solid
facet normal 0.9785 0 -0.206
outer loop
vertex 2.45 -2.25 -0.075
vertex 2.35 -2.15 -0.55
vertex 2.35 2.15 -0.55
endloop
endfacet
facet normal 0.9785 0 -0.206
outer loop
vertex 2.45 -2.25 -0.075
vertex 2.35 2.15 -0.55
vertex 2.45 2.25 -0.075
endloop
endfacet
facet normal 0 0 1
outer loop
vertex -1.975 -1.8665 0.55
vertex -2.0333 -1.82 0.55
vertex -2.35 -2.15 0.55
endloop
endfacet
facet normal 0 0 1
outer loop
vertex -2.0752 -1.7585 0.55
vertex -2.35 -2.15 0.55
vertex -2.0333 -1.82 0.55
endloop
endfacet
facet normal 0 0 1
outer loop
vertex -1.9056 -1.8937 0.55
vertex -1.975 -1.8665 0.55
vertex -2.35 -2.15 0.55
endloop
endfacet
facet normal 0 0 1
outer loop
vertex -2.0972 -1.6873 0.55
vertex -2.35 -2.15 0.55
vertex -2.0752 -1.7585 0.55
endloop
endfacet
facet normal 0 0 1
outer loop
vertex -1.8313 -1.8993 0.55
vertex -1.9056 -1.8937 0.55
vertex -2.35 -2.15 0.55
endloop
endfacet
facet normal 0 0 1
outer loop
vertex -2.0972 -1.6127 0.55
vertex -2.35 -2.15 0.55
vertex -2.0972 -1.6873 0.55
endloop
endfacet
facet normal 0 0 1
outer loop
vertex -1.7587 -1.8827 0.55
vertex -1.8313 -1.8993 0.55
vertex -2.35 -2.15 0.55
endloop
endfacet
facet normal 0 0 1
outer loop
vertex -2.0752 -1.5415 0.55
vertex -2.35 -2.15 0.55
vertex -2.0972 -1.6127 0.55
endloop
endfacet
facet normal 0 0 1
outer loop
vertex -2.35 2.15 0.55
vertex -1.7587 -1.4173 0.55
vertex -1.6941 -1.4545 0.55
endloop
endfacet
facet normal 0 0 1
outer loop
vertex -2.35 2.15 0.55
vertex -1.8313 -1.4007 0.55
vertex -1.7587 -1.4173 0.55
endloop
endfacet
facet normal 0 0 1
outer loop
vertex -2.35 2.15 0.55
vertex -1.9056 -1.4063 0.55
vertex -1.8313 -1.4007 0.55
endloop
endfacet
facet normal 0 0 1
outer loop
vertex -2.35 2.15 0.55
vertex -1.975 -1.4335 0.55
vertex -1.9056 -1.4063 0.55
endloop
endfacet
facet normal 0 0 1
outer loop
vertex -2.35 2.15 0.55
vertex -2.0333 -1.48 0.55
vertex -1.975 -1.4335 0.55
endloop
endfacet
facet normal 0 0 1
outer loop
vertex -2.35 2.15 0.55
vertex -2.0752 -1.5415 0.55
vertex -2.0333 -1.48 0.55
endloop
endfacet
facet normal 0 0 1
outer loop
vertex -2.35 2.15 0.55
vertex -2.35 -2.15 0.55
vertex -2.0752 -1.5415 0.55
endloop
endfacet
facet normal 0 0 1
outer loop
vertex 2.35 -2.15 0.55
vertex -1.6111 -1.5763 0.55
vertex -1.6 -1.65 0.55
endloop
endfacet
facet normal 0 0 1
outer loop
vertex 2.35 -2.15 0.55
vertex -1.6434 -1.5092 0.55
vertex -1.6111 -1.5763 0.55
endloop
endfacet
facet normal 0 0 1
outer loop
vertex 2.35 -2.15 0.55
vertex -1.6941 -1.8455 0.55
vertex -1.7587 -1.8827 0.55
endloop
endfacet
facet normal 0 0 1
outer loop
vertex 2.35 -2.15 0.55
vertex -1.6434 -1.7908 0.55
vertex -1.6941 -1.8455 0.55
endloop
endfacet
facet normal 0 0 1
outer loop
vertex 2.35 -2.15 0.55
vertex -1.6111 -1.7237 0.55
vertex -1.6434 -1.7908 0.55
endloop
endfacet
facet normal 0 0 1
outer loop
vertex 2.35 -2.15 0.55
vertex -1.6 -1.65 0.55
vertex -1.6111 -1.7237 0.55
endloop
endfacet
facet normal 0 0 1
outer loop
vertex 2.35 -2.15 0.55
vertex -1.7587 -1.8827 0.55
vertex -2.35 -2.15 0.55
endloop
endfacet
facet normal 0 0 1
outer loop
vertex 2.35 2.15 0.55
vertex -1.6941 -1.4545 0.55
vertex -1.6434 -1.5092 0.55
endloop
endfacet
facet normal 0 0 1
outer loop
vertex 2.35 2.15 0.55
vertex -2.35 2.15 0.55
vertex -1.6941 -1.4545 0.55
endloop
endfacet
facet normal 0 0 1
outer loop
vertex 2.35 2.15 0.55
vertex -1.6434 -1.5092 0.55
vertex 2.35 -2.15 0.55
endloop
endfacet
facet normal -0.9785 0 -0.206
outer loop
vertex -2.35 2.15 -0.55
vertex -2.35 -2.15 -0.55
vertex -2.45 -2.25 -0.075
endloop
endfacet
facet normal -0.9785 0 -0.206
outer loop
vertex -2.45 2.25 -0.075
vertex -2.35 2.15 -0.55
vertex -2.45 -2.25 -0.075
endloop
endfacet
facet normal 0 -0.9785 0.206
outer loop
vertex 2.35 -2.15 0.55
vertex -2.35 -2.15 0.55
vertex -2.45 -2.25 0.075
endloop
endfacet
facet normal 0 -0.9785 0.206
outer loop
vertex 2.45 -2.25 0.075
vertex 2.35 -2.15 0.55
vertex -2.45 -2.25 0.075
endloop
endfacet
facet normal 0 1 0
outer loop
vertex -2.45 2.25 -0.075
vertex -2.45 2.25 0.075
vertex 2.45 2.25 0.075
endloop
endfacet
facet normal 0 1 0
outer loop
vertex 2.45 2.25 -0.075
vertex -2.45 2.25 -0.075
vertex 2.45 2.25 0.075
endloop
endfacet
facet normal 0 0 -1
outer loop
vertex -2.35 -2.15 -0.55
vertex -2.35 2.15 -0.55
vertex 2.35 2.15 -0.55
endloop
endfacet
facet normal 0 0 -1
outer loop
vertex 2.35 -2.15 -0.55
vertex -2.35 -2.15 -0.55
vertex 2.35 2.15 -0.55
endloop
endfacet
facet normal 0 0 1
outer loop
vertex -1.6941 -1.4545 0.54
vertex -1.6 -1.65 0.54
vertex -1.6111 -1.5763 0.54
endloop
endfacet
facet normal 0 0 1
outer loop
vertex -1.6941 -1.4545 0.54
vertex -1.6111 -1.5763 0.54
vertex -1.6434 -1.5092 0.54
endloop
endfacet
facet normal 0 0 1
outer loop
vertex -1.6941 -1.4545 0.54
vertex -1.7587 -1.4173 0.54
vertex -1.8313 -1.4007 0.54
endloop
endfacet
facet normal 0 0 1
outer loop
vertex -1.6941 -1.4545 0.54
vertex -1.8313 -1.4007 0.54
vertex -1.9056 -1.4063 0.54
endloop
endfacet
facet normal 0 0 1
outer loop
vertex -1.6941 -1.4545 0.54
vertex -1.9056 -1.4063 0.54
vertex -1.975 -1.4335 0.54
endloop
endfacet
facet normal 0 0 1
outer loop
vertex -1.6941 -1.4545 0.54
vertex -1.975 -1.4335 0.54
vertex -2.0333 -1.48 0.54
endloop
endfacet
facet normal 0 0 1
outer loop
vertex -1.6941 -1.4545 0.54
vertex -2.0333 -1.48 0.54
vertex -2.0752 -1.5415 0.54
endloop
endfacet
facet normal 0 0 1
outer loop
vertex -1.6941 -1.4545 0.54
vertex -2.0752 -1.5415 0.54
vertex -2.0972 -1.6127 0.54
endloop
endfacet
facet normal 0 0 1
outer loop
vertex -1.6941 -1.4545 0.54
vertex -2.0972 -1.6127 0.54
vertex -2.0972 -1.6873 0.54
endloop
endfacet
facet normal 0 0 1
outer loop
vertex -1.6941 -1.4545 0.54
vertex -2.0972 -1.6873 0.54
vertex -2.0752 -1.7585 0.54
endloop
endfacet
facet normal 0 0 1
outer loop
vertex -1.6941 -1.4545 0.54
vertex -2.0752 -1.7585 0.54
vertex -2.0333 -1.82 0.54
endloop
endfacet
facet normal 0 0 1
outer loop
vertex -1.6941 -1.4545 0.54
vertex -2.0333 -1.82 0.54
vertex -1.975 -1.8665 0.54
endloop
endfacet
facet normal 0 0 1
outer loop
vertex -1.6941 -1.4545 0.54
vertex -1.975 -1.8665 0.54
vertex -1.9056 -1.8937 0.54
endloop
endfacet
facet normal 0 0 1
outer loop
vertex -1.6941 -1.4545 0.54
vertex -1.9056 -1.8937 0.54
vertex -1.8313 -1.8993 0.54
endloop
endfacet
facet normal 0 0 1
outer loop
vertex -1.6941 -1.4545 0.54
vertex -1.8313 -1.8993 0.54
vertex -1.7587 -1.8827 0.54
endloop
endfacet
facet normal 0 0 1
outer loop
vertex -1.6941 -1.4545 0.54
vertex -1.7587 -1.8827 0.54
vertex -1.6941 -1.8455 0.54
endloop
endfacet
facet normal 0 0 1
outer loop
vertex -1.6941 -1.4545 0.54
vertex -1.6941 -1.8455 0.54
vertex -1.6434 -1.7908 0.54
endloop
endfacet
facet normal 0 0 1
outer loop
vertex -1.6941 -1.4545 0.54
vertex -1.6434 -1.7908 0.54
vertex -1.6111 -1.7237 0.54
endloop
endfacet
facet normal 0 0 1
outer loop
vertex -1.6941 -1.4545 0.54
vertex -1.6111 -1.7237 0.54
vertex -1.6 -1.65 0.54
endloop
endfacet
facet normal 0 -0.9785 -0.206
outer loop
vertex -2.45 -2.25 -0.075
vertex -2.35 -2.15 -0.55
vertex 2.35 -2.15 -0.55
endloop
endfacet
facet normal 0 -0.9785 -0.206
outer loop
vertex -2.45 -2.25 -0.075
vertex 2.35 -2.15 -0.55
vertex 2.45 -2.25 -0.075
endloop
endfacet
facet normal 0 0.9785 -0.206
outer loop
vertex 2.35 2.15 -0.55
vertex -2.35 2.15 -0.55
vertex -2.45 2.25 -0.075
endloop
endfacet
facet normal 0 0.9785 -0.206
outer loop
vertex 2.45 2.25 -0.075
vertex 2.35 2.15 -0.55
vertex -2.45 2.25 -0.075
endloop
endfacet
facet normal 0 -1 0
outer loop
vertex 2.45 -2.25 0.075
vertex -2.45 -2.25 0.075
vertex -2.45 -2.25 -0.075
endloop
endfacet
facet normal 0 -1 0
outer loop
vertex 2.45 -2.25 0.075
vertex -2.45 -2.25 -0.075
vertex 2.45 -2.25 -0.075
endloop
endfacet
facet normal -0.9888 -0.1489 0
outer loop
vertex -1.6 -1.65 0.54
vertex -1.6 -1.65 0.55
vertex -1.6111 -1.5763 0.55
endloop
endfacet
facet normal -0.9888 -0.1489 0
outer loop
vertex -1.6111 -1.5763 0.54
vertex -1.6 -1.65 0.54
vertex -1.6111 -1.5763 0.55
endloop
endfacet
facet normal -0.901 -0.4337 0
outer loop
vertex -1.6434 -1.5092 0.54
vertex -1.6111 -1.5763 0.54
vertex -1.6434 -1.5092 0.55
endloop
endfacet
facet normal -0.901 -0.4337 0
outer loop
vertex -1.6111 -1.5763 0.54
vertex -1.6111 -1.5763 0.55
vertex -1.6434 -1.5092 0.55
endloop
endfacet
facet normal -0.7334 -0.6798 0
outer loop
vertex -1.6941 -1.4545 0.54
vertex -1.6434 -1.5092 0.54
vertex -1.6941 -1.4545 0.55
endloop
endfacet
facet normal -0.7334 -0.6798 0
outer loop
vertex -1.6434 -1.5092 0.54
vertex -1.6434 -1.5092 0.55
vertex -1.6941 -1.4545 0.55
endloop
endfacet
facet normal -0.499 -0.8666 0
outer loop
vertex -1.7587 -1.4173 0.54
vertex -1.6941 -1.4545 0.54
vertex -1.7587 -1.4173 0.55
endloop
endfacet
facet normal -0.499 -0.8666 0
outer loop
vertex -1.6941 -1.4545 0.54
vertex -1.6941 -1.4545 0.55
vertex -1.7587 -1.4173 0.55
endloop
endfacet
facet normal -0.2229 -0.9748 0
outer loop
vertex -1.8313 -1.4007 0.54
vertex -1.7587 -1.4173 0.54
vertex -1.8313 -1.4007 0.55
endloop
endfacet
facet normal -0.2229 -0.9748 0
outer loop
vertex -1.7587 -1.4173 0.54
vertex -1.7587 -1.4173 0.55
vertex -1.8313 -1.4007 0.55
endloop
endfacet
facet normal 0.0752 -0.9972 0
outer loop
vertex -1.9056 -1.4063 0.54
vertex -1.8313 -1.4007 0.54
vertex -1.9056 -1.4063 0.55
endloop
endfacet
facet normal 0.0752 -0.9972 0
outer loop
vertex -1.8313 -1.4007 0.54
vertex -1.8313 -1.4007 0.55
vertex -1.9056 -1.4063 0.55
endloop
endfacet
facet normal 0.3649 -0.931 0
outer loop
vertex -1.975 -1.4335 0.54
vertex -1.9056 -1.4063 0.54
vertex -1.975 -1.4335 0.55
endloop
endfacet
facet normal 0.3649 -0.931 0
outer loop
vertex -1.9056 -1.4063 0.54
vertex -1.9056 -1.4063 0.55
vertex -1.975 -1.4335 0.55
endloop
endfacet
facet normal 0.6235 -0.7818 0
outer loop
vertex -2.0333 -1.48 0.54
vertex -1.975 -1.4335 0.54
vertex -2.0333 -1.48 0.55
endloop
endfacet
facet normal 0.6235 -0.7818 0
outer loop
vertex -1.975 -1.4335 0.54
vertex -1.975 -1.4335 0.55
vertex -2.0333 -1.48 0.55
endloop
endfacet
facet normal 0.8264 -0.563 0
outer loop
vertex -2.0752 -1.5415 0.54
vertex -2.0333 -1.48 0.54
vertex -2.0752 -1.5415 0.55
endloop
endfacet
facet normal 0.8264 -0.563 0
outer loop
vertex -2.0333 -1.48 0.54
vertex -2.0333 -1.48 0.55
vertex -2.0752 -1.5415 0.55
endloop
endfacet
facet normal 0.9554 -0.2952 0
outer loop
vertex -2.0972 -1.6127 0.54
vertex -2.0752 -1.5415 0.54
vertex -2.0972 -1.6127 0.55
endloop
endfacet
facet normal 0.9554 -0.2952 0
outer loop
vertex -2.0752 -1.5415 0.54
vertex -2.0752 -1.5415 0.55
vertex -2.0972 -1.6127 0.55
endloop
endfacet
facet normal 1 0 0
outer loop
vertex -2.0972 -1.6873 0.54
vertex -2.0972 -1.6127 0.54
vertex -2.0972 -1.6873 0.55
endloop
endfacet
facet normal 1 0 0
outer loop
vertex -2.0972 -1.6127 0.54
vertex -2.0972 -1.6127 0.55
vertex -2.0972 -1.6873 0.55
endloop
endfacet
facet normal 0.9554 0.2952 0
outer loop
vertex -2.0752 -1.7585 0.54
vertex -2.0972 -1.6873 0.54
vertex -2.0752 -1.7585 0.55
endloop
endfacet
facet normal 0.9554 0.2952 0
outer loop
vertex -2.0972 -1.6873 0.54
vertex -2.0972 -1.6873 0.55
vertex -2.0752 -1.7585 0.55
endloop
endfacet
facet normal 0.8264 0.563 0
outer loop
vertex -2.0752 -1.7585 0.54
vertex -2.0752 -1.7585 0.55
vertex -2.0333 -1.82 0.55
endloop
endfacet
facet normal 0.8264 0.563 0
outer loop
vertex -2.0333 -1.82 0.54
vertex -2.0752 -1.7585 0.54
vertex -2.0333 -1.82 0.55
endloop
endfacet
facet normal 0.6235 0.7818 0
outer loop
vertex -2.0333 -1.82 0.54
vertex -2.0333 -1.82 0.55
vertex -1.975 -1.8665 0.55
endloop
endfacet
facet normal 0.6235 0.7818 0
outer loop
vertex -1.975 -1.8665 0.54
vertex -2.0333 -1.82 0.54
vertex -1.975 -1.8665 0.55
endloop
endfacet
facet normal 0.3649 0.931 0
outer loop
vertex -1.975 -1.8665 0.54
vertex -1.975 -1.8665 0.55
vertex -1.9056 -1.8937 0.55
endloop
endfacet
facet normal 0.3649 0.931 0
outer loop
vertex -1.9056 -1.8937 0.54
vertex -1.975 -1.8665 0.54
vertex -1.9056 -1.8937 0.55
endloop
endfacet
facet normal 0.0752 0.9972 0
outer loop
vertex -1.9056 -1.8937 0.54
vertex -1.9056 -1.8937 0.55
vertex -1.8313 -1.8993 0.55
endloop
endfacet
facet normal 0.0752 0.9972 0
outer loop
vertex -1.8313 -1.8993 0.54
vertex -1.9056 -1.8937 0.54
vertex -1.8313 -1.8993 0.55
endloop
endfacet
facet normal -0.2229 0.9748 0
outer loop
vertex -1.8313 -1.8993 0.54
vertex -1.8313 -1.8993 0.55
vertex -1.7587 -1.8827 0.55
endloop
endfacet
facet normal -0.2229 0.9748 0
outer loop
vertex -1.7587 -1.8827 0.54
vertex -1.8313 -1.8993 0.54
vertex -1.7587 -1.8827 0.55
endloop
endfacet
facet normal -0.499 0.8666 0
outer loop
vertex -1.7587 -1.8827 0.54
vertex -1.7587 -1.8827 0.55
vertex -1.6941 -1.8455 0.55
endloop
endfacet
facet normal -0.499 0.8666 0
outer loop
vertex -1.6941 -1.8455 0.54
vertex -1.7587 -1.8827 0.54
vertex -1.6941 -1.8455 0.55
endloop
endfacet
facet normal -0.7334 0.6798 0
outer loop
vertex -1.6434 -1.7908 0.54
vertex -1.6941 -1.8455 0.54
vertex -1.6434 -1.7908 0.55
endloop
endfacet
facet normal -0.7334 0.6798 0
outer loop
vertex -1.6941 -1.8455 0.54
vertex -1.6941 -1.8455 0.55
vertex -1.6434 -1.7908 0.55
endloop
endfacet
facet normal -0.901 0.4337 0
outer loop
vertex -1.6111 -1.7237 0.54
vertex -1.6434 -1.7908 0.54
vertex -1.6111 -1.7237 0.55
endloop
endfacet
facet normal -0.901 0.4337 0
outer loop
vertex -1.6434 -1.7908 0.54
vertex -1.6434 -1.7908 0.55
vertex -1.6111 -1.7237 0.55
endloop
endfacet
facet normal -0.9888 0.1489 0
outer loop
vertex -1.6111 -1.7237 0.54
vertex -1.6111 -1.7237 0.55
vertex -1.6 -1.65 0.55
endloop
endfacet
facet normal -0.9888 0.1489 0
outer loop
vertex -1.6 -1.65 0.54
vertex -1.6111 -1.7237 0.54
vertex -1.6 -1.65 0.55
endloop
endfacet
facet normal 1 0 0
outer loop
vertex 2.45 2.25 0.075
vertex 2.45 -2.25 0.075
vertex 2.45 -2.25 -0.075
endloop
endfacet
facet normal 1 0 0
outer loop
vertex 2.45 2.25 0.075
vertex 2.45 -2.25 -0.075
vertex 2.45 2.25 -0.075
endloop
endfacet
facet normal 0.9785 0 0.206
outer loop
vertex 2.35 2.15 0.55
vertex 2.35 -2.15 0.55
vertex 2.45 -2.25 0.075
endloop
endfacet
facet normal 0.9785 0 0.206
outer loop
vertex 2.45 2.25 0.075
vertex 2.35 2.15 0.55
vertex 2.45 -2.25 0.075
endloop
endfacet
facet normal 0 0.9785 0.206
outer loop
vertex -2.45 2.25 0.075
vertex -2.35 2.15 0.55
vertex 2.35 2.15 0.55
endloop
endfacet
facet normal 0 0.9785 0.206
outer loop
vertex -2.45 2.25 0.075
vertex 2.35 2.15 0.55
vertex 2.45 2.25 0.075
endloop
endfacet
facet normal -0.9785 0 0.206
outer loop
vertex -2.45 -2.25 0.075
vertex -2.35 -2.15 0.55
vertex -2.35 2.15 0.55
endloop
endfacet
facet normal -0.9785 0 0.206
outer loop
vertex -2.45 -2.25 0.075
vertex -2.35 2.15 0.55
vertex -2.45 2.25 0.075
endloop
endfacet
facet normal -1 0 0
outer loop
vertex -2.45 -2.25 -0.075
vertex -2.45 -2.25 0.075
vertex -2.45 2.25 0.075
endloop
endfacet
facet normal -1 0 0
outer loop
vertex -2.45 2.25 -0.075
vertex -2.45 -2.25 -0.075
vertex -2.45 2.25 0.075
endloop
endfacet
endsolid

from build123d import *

# Parameters (mm, degrees)
SKETCH1_W            = 4.9
SKETCH1_H            = 4.5
BOSS_EXTRUDE1_DEPTH  = 0.55
CUT_EXTRUDE1_DEPTH   = 5.9
MIRROR2_COPY_1_DEPTH = 5.9
CUT_EXTRUDE2_DEPTH   = 5.5
MIRROR4_COPY_1_DEPTH = 5.5
SKETCH4_R            = 0.25
CUT_EXTRUDE3_DEPTH   = 0.01


with BuildPart() as part:
    # Sketch1 → Boss-Extrude1 (new body, symmetric)
    with BuildSketch(Plane.XY):
        Rectangle(SKETCH1_W, SKETCH1_H)
    extrude(amount=BOSS_EXTRUDE1_DEPTH, both=True)

    # Sketch2 → Cut-Extrude1 (cut, through all)
    with BuildSketch(Plane.ZY.offset(2.45)):
        Polygon((0.55, -2.15), (0.075, -2.25), (0.55, -2.25), align=None)
    cut_extrude1 = extrude(amount=-CUT_EXTRUDE1_DEPTH, mode=Mode.SUBTRACT)

    # Mirror1: Cut-Extrude1 across plane
    add(cut_extrude1.mirror(Plane.ZX), mode=Mode.SUBTRACT)

    # Mirror2: Cut-Extrude1 across plane
    add(cut_extrude1.mirror(Plane.XY), mode=Mode.SUBTRACT)

    # Mirror2 copy 1 sketch → Mirror2 copy 1 (cut, through all)
    with BuildSketch(Plane(origin=(-2.45, 0, 0), x_dir=(0, 0, -1), z_dir=(-1, 0, 0))):
        Polygon((0.55, -2.15), (0.075, -2.25), (0.55, -2.25), align=None)
    extrude(amount=-MIRROR2_COPY_1_DEPTH, mode=Mode.SUBTRACT)

    # Sketch3 → Cut-Extrude2 (cut, through all)
    with BuildSketch(Plane.XZ.offset(2.25)):
        Polygon((-2.45, 0.55), (-2.35, 0.55), (-2.45, 0.075), align=None)
    cut_extrude2 = extrude(amount=-CUT_EXTRUDE2_DEPTH, mode=Mode.SUBTRACT)

    # Mirror3: Cut-Extrude2 across plane
    add(cut_extrude2.mirror(Plane(origin=(0, 0, 0), x_dir=(0, 0, 1), z_dir=(1, 0, 0))), mode=Mode.SUBTRACT)

    # Mirror4: Cut-Extrude2 across plane
    add(cut_extrude2.mirror(Plane.XY), mode=Mode.SUBTRACT)

    # Mirror4 copy 1 sketch → Mirror4 copy 1 (cut, through all)
    with BuildSketch(Plane(origin=(0, -2.25, 0), x_dir=(-1, 0, 0), z_dir=(0, -1, 0))):
        Polygon((-2.45, 0.55), (-2.35, 0.55), (-2.45, 0.075), align=None)
    extrude(amount=-MIRROR4_COPY_1_DEPTH, mode=Mode.SUBTRACT)

    # Sketch4 → Cut-Extrude3 (cut)
    with BuildSketch(Plane.XY.offset(0.55)):
        with Locations((-1.85, -1.65)):
            Circle(SKETCH4_R)
    extrude(amount=-CUT_EXTRUDE3_DEPTH, mode=Mode.SUBTRACT)


solid = part.part
